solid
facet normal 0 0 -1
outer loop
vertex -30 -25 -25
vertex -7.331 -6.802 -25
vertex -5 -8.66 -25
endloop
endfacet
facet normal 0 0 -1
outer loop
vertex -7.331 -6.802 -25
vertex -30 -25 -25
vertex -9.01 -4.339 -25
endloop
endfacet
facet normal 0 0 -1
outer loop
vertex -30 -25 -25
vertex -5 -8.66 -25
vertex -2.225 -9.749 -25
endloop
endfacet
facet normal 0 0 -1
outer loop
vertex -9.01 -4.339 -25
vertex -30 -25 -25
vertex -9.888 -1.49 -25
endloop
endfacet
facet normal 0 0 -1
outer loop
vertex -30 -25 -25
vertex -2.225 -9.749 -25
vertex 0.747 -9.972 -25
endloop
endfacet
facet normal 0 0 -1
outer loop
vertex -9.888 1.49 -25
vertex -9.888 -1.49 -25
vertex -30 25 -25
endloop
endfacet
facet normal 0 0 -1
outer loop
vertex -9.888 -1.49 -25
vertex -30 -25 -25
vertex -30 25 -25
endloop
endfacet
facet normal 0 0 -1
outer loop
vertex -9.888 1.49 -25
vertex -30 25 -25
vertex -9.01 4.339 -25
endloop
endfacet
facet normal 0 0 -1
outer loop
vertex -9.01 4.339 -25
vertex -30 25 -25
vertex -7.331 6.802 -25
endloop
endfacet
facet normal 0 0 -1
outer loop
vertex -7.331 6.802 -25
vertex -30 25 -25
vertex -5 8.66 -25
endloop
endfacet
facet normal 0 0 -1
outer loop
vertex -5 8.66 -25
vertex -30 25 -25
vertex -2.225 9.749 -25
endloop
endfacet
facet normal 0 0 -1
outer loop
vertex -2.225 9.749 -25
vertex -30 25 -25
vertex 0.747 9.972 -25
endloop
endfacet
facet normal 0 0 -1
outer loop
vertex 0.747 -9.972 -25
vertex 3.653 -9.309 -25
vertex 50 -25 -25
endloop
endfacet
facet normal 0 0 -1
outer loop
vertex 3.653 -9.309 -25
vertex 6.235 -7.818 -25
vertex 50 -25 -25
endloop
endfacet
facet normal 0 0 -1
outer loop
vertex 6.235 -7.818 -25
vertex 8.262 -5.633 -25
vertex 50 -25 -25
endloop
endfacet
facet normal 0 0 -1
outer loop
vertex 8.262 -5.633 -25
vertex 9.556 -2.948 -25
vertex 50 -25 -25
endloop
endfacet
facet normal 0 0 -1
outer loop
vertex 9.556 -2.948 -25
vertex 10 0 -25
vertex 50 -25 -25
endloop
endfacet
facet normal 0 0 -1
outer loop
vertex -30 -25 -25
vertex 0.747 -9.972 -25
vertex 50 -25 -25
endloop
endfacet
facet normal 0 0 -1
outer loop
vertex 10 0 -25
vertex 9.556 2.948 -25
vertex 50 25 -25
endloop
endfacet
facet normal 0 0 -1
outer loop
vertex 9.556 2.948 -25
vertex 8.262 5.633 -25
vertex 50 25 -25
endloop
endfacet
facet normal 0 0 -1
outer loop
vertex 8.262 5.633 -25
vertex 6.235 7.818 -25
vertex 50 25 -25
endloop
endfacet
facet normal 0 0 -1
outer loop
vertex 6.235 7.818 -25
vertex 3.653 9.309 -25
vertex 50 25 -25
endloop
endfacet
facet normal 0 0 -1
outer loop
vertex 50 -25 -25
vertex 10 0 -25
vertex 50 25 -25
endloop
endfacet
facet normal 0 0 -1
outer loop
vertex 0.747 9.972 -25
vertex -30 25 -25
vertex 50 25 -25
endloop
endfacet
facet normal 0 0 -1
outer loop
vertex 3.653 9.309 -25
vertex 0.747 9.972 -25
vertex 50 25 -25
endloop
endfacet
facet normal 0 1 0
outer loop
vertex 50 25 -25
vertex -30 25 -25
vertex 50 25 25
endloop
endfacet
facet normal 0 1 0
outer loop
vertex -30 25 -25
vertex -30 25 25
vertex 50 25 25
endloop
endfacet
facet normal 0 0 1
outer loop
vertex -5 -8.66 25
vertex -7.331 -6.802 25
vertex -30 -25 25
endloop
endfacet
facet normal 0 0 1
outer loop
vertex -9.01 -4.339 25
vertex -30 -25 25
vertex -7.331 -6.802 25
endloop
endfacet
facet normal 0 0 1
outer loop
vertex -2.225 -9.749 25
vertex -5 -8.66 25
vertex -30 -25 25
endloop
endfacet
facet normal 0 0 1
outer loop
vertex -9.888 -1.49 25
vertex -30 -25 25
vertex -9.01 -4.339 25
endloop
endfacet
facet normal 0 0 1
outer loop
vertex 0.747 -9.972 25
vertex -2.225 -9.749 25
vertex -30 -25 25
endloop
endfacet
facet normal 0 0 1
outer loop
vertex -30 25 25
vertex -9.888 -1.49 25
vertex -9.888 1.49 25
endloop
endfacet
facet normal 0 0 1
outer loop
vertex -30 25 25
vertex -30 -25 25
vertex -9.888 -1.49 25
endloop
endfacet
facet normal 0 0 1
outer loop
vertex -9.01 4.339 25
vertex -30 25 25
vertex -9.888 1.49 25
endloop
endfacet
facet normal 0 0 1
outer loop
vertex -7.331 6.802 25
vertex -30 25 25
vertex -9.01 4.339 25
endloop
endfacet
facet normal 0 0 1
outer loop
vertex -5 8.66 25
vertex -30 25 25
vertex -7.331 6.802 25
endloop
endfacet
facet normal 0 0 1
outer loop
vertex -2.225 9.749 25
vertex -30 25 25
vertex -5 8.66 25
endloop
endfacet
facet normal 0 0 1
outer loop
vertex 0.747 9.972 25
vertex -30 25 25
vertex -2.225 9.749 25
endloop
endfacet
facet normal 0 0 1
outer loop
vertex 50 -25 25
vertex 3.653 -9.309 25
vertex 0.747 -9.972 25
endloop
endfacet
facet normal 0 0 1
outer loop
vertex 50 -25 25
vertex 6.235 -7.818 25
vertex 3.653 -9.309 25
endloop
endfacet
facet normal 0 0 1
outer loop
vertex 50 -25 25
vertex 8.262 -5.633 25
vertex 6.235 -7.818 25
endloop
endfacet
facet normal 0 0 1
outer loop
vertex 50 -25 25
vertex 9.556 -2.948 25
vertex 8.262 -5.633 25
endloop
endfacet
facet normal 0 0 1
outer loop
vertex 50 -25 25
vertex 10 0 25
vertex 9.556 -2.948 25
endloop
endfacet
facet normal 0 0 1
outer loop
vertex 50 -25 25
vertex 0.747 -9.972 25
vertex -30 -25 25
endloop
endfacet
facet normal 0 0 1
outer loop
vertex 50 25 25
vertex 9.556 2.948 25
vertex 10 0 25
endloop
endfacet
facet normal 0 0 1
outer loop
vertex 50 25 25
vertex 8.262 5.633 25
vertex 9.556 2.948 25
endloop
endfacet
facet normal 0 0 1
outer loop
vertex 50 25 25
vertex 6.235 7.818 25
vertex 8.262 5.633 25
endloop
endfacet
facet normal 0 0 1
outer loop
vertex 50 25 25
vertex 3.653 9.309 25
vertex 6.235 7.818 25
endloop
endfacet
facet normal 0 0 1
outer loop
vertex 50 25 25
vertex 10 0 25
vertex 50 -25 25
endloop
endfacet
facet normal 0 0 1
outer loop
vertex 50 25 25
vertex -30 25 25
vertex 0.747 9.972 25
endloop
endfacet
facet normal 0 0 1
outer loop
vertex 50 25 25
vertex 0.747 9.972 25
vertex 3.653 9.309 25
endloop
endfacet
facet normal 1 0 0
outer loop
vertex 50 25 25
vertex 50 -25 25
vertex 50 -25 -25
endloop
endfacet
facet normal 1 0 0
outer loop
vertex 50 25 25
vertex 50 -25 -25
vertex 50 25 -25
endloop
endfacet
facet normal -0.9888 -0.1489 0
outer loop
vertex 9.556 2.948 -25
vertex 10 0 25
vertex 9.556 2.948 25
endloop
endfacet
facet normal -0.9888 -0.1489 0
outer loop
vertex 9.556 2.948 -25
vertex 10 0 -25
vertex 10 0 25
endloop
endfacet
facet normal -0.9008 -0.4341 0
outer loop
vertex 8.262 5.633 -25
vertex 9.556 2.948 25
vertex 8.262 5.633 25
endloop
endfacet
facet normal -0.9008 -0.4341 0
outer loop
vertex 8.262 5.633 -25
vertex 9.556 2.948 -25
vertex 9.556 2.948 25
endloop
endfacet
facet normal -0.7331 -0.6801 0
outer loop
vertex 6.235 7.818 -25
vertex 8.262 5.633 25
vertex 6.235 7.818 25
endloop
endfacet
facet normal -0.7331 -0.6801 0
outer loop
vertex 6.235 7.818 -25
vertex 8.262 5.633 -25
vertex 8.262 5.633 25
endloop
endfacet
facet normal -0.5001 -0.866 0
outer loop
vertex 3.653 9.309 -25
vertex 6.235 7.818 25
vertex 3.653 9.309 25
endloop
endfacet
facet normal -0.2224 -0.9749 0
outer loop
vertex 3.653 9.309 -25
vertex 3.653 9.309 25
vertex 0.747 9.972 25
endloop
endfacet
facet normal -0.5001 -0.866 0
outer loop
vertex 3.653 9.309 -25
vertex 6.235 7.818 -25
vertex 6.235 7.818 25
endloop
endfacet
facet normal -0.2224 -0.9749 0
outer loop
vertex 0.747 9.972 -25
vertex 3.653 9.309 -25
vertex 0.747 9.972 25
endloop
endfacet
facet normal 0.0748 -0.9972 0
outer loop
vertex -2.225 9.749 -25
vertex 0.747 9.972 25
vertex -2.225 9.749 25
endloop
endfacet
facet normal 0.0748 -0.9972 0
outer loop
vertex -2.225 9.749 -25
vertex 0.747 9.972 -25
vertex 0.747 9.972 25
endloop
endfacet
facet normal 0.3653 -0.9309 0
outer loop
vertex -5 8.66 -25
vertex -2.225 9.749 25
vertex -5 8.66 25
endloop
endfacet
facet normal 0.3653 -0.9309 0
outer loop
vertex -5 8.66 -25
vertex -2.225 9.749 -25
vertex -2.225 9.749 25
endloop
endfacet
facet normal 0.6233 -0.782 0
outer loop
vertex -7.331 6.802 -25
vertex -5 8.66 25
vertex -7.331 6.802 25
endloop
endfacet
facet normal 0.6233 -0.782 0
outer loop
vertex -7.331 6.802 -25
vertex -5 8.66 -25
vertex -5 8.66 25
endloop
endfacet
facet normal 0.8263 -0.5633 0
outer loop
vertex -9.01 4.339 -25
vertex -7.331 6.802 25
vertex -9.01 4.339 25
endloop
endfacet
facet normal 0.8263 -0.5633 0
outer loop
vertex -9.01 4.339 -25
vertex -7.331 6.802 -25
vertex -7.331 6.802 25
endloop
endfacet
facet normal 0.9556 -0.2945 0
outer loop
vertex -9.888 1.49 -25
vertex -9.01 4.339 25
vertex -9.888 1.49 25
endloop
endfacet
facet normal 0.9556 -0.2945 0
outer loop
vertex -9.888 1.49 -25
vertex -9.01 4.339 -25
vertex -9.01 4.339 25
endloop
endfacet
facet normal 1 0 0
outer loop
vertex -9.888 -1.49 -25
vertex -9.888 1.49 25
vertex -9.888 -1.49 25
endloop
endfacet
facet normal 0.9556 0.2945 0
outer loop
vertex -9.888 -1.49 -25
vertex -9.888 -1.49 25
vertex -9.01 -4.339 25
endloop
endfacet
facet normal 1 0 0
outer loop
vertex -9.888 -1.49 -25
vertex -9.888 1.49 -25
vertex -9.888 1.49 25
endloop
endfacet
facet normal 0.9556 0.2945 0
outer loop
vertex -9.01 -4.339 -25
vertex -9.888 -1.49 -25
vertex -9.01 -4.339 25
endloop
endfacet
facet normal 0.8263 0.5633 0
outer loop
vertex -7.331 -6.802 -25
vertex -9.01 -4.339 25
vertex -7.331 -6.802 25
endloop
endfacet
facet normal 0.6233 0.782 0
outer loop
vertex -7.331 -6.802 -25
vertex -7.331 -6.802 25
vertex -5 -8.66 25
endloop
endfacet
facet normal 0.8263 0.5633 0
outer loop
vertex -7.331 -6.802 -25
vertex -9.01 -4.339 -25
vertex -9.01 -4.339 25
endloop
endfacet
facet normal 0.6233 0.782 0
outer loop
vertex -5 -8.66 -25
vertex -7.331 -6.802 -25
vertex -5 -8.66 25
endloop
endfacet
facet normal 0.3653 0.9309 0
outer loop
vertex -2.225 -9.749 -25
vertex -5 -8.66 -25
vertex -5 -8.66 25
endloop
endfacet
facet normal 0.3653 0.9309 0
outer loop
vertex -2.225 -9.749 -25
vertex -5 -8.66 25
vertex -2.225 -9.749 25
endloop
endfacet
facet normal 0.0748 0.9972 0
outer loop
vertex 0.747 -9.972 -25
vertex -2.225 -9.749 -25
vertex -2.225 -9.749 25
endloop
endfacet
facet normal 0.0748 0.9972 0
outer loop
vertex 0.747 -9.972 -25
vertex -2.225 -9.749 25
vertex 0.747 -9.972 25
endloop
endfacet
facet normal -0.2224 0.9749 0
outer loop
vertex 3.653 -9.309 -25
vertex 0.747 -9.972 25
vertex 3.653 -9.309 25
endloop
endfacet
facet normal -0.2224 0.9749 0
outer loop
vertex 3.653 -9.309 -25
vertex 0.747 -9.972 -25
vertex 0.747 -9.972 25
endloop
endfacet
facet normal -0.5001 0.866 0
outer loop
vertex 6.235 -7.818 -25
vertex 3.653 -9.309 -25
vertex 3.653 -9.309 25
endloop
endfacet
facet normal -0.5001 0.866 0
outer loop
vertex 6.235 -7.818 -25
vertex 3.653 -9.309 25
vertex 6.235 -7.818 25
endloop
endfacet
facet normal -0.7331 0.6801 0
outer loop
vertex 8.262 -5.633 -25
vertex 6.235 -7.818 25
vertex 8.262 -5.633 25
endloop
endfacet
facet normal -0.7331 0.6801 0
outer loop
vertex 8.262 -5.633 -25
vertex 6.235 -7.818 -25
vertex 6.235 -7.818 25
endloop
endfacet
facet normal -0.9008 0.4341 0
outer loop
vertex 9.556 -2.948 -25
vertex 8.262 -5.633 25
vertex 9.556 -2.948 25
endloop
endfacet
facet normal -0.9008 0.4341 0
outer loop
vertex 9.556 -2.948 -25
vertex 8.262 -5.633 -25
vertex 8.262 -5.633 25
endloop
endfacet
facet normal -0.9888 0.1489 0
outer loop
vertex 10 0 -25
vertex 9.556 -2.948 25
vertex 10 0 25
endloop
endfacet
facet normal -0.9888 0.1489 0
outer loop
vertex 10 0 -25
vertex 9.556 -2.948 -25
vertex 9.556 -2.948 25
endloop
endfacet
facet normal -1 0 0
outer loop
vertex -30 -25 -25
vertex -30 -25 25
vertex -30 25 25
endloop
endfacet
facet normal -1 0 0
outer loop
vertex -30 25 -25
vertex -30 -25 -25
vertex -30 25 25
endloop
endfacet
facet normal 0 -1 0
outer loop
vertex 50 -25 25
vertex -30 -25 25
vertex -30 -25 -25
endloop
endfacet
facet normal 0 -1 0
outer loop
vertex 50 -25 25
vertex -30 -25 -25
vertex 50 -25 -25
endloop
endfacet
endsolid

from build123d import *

# Parameters (mm, degrees)
SKETCH_1_W      = 80
SKETCH_1_H      = 50
SKETCH_1_R      = 10
EXTRUDE_1_DEPTH = 25


with BuildPart() as part:
    # Эскиз1 → Бобышка-Вытянуть1 (new body, symmetric)
    with BuildSketch(Plane.XY):
        with Locations((10, 0)):
            Rectangle(SKETCH_1_W, SKETCH_1_H)
        Circle(SKETCH_1_R, mode=Mode.SUBTRACT)
    extrude(amount=EXTRUDE_1_DEPTH, both=True)


solid = part.part
